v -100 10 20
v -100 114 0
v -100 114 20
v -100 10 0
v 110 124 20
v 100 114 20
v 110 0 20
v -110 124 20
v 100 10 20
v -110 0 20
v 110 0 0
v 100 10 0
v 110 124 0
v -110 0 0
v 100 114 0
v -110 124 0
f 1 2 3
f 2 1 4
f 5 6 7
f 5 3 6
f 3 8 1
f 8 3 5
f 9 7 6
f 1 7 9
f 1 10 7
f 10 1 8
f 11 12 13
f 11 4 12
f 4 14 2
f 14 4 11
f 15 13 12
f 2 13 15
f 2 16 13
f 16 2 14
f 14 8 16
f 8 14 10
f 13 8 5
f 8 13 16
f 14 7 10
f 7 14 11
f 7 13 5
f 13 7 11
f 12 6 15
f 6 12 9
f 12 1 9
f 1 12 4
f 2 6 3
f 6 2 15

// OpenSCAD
// Inside width of drawer is 15.75 inches.
// Space between tray and back of drawer is about 4-7/8 inches.
// Printer bed is 220x220.

width = 400;
depth = 124;
max_width = 220;
bar_width = 10;
bar_height = 20;

// left bar
translate([0 - max_width/2, 0, 0]) {
    cube([bar_width, depth, bar_height]);
}

// right bar    
translate([0 + max_width/2 - bar_width, 0, 0]) {
    cube([bar_width, depth, bar_height]);
}

// rear bar
translate([0 - max_width/2, 0, 0]) {
    cube([max_width, bar_width, bar_height]);
}

// front bar
translate([0 - max_width/2, depth - bar_width, 0]) {
    cube([max_width, bar_width, bar_height]);
}
